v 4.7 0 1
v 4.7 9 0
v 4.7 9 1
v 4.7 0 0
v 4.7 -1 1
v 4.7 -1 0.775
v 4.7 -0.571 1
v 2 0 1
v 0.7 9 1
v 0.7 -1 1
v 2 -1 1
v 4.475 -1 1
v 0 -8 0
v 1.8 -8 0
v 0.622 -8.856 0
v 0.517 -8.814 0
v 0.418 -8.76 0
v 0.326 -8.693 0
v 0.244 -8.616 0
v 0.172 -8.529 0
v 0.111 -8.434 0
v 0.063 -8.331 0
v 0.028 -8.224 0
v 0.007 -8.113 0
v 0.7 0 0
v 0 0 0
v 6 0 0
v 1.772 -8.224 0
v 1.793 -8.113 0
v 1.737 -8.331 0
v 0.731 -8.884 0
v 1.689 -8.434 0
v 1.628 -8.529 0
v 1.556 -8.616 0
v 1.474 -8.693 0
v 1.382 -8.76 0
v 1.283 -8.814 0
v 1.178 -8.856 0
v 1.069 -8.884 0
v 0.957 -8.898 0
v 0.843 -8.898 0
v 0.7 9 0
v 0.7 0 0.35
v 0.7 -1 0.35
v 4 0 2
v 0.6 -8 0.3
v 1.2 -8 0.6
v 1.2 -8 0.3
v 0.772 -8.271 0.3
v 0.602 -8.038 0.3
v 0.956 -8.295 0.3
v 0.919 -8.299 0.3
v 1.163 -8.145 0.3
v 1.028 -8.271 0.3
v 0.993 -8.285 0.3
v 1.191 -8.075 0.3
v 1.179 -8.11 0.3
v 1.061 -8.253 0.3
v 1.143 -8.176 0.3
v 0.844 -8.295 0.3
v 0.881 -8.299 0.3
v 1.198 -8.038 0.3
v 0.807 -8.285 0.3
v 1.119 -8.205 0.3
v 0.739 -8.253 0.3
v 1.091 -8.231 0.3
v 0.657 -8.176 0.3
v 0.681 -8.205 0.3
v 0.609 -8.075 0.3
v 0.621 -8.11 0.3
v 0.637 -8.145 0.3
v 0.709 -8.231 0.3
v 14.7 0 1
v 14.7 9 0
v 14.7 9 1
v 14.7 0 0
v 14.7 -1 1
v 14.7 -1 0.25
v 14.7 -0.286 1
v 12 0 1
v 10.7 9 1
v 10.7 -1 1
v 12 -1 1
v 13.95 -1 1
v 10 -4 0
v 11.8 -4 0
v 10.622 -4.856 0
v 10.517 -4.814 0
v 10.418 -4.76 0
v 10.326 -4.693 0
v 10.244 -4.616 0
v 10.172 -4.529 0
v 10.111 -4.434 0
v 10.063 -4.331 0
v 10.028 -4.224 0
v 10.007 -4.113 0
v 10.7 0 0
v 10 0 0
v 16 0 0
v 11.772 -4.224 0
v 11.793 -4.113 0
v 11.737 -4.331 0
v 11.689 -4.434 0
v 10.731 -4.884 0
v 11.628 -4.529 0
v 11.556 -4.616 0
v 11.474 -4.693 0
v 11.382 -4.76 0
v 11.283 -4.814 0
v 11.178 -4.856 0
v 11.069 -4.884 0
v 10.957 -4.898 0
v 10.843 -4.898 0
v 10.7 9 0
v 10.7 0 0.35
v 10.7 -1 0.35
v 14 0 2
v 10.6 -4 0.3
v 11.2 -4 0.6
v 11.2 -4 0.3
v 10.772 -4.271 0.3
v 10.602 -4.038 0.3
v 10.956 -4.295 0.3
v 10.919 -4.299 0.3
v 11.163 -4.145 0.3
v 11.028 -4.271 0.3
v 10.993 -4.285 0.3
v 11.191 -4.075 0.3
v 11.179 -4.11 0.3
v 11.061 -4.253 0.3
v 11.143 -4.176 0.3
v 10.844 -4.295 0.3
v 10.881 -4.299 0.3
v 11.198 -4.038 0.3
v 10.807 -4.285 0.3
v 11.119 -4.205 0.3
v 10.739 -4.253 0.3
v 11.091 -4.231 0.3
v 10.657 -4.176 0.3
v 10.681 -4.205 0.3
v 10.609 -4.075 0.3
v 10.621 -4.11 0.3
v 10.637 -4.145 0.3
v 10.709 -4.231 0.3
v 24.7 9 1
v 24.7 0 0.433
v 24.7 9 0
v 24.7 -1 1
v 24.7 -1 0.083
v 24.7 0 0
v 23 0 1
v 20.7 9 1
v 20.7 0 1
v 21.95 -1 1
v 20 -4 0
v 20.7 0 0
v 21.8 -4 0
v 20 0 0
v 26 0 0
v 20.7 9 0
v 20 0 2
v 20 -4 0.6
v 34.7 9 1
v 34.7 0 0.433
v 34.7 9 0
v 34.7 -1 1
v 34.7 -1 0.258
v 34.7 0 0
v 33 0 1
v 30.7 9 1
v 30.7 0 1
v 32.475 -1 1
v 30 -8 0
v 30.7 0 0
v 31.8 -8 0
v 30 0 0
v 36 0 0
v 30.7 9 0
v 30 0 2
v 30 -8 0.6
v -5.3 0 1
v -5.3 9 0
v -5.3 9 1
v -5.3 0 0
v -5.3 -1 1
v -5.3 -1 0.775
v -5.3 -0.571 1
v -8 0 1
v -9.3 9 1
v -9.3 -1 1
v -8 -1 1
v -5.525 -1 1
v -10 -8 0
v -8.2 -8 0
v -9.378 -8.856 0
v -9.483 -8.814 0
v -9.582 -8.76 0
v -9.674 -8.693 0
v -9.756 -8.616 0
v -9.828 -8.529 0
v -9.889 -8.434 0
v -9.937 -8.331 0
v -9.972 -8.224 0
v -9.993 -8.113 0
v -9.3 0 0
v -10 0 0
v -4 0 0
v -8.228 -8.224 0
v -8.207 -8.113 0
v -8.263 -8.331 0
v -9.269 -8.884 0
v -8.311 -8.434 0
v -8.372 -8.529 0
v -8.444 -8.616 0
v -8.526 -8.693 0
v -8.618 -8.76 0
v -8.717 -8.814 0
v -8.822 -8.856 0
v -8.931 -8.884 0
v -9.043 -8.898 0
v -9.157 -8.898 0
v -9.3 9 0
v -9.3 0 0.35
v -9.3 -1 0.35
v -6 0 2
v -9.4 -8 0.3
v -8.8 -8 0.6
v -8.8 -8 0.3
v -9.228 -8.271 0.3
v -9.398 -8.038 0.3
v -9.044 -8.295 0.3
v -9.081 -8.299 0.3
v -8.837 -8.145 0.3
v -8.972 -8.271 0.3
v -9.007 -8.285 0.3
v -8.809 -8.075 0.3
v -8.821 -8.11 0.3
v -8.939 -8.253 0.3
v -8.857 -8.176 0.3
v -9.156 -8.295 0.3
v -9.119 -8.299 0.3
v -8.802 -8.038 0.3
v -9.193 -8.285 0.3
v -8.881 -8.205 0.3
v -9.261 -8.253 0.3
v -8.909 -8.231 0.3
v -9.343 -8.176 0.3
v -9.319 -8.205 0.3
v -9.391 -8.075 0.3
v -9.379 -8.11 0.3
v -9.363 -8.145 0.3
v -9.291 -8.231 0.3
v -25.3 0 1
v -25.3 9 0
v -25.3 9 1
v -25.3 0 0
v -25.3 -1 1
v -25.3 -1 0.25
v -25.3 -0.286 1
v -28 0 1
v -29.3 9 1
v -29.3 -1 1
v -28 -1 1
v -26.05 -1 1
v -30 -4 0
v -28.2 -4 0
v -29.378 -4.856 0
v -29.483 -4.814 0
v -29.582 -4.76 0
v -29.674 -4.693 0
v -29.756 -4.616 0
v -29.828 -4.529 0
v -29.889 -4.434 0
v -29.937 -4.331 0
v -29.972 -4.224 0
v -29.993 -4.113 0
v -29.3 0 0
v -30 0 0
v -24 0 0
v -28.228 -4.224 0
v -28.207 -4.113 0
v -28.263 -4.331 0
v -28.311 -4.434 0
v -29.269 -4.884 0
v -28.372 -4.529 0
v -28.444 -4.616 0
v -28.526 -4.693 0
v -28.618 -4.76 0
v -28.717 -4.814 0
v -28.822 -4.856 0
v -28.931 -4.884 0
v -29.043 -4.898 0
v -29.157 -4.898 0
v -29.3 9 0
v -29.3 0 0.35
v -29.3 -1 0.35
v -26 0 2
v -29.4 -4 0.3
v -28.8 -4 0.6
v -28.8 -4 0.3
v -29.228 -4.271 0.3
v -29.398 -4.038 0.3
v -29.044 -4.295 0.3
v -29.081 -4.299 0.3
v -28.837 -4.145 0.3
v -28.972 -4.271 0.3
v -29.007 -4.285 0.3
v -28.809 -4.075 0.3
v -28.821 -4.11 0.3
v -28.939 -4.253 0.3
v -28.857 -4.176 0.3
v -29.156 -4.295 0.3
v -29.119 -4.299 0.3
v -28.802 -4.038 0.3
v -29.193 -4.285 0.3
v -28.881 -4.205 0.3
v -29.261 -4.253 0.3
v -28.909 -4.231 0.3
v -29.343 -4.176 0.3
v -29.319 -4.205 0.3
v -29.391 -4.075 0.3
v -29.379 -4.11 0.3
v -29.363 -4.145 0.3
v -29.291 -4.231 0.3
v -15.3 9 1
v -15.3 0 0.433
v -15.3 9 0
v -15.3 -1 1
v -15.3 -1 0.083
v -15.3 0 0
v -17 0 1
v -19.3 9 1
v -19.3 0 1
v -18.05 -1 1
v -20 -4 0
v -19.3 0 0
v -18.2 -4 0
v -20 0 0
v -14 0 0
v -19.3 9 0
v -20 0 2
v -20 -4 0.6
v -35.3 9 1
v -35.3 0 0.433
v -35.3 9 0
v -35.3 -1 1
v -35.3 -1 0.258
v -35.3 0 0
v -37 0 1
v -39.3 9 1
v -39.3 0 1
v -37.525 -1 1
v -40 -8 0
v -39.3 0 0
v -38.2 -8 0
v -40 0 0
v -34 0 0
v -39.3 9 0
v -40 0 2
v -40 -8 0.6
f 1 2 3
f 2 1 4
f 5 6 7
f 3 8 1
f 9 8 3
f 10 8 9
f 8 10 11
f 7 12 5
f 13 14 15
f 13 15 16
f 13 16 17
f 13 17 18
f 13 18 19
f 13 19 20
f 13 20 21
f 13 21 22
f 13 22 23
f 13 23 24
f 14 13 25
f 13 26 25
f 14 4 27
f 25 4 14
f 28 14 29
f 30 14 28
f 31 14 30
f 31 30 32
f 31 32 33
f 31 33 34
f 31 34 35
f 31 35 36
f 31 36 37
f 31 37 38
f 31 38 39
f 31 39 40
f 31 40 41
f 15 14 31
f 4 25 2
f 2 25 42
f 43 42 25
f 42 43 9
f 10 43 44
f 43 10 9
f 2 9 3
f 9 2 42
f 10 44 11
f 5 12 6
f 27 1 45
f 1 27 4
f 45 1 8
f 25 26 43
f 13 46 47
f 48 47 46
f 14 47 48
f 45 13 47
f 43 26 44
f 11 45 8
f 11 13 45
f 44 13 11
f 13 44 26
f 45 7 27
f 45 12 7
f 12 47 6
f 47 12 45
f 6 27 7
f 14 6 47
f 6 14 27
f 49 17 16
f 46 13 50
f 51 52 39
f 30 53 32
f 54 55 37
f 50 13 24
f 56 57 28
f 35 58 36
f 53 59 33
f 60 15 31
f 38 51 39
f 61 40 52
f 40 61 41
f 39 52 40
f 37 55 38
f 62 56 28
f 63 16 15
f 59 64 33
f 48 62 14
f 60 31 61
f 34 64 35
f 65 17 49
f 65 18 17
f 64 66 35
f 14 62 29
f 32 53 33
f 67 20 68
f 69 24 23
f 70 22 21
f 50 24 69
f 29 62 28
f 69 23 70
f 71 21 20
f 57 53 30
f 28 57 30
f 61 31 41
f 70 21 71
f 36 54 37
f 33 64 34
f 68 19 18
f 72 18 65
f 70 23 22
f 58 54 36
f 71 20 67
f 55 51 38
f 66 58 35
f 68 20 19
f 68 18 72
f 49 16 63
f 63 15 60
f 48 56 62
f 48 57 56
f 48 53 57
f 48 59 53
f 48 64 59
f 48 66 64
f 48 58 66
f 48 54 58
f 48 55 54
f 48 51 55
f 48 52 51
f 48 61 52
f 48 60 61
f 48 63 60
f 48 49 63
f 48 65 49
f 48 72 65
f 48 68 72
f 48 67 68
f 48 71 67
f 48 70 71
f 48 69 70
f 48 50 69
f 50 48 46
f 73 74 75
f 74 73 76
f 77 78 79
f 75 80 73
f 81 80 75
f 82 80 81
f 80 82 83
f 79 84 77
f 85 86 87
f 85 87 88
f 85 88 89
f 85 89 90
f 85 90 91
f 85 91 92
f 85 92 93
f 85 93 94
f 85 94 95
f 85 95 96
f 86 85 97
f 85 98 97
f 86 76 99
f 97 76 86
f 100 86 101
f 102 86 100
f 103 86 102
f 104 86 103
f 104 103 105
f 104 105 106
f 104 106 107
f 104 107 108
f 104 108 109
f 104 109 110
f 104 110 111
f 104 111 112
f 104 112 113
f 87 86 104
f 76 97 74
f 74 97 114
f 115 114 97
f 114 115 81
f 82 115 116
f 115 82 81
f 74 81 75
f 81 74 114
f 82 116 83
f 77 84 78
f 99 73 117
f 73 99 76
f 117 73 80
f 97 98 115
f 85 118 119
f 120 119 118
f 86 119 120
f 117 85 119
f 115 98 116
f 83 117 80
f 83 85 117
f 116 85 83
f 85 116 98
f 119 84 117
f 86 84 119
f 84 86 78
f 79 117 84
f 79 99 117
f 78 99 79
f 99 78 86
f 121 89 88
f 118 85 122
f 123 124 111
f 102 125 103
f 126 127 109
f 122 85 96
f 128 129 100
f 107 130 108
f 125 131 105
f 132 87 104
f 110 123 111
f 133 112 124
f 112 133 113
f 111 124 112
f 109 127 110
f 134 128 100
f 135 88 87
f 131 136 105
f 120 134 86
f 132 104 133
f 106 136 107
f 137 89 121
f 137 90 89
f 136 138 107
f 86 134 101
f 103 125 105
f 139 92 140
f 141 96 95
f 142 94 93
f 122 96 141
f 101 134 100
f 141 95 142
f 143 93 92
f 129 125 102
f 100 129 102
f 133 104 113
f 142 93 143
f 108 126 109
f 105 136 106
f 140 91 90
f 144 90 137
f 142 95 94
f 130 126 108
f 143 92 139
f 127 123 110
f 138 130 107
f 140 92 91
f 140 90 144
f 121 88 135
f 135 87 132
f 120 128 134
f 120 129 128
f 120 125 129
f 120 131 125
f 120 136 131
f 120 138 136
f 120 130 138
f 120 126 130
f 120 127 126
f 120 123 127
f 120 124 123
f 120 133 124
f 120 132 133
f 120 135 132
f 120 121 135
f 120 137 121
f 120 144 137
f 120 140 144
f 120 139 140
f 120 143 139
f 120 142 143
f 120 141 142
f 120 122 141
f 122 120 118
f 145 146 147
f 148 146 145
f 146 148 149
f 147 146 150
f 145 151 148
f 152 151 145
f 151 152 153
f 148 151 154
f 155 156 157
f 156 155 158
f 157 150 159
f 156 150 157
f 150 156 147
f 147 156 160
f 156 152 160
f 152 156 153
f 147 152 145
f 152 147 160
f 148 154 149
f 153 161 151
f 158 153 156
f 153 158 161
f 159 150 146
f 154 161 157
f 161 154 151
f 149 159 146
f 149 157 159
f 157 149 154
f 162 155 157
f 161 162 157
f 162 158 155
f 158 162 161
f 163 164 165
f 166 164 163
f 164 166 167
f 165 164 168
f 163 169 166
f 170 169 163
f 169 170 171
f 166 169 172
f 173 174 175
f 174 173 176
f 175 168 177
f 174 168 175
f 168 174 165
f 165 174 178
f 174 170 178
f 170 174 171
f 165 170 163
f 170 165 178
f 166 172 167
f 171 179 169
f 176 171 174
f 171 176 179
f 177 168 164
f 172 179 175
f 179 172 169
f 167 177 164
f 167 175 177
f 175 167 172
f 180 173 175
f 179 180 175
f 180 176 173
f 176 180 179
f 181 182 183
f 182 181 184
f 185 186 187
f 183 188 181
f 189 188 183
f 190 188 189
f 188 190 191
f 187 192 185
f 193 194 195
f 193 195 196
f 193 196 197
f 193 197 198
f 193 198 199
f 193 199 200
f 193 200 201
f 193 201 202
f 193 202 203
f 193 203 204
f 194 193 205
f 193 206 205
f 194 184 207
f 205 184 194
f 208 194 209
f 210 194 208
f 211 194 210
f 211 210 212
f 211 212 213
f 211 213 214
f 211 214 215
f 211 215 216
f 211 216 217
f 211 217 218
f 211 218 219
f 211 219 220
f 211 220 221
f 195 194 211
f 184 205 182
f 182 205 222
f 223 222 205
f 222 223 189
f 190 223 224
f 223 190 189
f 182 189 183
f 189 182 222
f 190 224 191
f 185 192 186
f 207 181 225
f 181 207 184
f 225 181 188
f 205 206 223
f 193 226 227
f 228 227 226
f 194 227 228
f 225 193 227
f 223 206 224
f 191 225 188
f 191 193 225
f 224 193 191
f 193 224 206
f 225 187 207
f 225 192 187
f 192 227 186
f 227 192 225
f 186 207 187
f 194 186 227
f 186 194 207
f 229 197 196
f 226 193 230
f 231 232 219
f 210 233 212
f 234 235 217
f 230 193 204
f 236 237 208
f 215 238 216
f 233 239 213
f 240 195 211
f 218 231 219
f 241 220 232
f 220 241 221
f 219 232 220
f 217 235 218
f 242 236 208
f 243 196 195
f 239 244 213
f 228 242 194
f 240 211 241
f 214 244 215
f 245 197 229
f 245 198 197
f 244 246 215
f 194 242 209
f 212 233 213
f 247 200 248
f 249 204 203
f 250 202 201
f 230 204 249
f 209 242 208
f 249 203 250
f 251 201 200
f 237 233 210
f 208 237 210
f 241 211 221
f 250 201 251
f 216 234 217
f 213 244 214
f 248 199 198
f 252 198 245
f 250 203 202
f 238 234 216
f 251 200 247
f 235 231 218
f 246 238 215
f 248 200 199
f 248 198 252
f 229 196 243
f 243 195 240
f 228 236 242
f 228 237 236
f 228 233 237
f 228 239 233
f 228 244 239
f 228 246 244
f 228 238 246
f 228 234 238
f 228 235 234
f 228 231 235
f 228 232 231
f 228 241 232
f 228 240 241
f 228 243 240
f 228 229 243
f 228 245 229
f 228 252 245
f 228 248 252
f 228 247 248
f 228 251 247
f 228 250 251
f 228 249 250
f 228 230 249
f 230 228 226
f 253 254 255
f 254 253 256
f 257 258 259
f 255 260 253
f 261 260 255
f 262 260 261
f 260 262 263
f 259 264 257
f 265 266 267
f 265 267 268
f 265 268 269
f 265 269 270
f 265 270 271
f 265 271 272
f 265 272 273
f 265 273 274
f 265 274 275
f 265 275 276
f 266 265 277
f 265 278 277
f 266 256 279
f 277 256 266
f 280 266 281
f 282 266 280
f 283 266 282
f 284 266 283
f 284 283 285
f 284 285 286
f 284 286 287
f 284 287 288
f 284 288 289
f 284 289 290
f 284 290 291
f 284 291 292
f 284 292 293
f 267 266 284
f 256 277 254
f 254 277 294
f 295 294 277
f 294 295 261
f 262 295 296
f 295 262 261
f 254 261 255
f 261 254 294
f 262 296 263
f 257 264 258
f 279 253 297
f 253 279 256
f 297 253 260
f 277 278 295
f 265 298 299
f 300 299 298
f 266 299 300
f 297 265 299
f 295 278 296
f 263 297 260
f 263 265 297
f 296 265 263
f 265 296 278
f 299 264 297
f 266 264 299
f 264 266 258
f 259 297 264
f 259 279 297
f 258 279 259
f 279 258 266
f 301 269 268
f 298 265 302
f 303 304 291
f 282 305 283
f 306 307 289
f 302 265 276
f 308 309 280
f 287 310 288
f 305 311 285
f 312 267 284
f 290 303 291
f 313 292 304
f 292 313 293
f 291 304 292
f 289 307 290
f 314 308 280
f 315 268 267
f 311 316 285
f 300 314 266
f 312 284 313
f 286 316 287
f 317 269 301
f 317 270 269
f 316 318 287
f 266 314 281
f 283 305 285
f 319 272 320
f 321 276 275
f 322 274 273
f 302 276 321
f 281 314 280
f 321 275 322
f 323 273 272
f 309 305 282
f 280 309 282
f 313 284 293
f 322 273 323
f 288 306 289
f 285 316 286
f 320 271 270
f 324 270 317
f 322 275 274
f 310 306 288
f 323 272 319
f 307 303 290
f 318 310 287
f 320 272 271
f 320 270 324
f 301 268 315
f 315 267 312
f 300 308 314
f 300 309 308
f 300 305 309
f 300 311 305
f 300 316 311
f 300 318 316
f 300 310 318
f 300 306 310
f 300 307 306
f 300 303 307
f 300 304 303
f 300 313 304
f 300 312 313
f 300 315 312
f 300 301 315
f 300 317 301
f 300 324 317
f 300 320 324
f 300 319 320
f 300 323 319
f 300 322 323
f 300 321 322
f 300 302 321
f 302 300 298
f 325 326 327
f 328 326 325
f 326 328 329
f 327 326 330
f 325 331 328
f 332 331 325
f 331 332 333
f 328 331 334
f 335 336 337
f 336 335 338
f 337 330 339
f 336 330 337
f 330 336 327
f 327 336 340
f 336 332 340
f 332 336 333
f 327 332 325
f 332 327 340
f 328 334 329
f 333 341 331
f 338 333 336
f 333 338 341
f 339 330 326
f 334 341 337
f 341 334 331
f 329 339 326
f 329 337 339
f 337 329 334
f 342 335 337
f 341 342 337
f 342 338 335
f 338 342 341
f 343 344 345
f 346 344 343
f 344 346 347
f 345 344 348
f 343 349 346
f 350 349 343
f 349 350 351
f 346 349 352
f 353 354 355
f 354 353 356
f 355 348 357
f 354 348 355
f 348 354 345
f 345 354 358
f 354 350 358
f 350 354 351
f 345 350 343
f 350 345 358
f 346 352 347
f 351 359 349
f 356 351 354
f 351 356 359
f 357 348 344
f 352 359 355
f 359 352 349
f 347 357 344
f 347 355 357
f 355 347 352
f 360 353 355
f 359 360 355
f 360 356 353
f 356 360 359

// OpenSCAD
$fn=3;

sd=10;
sy=60;

hby=10;
hbz=4;
ts=1;

bx=hbz+2;
by=8;


line();
module line(){
    translate([0,0,0])blade1(by);
    translate([10,0,0])blade1(by/2);
    translate([20,0,0])blade(by/2);
    translate([30,0,0])blade(by);

    translate([-10,0,0])blade1(by);
    translate([-30,0,0])blade1(by/2);
    translate([-20,0,0])blade(by/2);
    translate([-40,0,0])blade(by);
}

//pin();
//shr(0.5);
module shr(k){
    rotate_extrude(angle=-180, $fn=50)polygon(points=[[0,0],[0,k*ts], [k*bx/6,k*ts],[k*bx/2,0]]);
}
module pin(){
    difference(){
        translate([0,0,0])rotate([0,-90,0])cylinder(sy, sd/2, sd/2);
        translate([0.1-hby/2,0,0.5])cube([ hby, ts+0.2, hbz+0.2],true);
    }
}

//blade(by);
module blade(l){
    translate([0.7+hbz/2,hby/2-1,ts/2])cube([ hbz,hby, ts,],true);
    rotate([90,0,0])linear_extrude(height = l, center = false, convexity = 10, scale=0.3) polygon(points=[[0,0],[0,2*ts], [bx,0]]);
}
//blade1(by);
module blade1(l){
    translate([0.7+hbz/2,hby/2-1,ts/2])cube([ hbz,hby, ts,],true);
    rotate([90,0,0])linear_extrude(height = l, center = false, convexity = 10, scale=0.3) polygon(points=[[0,0],[bx/3,ts], [2*bx/3,2*ts],[bx,0]]);
    translate([bx*0.3/2,-l,0])shr(0.3);
}
